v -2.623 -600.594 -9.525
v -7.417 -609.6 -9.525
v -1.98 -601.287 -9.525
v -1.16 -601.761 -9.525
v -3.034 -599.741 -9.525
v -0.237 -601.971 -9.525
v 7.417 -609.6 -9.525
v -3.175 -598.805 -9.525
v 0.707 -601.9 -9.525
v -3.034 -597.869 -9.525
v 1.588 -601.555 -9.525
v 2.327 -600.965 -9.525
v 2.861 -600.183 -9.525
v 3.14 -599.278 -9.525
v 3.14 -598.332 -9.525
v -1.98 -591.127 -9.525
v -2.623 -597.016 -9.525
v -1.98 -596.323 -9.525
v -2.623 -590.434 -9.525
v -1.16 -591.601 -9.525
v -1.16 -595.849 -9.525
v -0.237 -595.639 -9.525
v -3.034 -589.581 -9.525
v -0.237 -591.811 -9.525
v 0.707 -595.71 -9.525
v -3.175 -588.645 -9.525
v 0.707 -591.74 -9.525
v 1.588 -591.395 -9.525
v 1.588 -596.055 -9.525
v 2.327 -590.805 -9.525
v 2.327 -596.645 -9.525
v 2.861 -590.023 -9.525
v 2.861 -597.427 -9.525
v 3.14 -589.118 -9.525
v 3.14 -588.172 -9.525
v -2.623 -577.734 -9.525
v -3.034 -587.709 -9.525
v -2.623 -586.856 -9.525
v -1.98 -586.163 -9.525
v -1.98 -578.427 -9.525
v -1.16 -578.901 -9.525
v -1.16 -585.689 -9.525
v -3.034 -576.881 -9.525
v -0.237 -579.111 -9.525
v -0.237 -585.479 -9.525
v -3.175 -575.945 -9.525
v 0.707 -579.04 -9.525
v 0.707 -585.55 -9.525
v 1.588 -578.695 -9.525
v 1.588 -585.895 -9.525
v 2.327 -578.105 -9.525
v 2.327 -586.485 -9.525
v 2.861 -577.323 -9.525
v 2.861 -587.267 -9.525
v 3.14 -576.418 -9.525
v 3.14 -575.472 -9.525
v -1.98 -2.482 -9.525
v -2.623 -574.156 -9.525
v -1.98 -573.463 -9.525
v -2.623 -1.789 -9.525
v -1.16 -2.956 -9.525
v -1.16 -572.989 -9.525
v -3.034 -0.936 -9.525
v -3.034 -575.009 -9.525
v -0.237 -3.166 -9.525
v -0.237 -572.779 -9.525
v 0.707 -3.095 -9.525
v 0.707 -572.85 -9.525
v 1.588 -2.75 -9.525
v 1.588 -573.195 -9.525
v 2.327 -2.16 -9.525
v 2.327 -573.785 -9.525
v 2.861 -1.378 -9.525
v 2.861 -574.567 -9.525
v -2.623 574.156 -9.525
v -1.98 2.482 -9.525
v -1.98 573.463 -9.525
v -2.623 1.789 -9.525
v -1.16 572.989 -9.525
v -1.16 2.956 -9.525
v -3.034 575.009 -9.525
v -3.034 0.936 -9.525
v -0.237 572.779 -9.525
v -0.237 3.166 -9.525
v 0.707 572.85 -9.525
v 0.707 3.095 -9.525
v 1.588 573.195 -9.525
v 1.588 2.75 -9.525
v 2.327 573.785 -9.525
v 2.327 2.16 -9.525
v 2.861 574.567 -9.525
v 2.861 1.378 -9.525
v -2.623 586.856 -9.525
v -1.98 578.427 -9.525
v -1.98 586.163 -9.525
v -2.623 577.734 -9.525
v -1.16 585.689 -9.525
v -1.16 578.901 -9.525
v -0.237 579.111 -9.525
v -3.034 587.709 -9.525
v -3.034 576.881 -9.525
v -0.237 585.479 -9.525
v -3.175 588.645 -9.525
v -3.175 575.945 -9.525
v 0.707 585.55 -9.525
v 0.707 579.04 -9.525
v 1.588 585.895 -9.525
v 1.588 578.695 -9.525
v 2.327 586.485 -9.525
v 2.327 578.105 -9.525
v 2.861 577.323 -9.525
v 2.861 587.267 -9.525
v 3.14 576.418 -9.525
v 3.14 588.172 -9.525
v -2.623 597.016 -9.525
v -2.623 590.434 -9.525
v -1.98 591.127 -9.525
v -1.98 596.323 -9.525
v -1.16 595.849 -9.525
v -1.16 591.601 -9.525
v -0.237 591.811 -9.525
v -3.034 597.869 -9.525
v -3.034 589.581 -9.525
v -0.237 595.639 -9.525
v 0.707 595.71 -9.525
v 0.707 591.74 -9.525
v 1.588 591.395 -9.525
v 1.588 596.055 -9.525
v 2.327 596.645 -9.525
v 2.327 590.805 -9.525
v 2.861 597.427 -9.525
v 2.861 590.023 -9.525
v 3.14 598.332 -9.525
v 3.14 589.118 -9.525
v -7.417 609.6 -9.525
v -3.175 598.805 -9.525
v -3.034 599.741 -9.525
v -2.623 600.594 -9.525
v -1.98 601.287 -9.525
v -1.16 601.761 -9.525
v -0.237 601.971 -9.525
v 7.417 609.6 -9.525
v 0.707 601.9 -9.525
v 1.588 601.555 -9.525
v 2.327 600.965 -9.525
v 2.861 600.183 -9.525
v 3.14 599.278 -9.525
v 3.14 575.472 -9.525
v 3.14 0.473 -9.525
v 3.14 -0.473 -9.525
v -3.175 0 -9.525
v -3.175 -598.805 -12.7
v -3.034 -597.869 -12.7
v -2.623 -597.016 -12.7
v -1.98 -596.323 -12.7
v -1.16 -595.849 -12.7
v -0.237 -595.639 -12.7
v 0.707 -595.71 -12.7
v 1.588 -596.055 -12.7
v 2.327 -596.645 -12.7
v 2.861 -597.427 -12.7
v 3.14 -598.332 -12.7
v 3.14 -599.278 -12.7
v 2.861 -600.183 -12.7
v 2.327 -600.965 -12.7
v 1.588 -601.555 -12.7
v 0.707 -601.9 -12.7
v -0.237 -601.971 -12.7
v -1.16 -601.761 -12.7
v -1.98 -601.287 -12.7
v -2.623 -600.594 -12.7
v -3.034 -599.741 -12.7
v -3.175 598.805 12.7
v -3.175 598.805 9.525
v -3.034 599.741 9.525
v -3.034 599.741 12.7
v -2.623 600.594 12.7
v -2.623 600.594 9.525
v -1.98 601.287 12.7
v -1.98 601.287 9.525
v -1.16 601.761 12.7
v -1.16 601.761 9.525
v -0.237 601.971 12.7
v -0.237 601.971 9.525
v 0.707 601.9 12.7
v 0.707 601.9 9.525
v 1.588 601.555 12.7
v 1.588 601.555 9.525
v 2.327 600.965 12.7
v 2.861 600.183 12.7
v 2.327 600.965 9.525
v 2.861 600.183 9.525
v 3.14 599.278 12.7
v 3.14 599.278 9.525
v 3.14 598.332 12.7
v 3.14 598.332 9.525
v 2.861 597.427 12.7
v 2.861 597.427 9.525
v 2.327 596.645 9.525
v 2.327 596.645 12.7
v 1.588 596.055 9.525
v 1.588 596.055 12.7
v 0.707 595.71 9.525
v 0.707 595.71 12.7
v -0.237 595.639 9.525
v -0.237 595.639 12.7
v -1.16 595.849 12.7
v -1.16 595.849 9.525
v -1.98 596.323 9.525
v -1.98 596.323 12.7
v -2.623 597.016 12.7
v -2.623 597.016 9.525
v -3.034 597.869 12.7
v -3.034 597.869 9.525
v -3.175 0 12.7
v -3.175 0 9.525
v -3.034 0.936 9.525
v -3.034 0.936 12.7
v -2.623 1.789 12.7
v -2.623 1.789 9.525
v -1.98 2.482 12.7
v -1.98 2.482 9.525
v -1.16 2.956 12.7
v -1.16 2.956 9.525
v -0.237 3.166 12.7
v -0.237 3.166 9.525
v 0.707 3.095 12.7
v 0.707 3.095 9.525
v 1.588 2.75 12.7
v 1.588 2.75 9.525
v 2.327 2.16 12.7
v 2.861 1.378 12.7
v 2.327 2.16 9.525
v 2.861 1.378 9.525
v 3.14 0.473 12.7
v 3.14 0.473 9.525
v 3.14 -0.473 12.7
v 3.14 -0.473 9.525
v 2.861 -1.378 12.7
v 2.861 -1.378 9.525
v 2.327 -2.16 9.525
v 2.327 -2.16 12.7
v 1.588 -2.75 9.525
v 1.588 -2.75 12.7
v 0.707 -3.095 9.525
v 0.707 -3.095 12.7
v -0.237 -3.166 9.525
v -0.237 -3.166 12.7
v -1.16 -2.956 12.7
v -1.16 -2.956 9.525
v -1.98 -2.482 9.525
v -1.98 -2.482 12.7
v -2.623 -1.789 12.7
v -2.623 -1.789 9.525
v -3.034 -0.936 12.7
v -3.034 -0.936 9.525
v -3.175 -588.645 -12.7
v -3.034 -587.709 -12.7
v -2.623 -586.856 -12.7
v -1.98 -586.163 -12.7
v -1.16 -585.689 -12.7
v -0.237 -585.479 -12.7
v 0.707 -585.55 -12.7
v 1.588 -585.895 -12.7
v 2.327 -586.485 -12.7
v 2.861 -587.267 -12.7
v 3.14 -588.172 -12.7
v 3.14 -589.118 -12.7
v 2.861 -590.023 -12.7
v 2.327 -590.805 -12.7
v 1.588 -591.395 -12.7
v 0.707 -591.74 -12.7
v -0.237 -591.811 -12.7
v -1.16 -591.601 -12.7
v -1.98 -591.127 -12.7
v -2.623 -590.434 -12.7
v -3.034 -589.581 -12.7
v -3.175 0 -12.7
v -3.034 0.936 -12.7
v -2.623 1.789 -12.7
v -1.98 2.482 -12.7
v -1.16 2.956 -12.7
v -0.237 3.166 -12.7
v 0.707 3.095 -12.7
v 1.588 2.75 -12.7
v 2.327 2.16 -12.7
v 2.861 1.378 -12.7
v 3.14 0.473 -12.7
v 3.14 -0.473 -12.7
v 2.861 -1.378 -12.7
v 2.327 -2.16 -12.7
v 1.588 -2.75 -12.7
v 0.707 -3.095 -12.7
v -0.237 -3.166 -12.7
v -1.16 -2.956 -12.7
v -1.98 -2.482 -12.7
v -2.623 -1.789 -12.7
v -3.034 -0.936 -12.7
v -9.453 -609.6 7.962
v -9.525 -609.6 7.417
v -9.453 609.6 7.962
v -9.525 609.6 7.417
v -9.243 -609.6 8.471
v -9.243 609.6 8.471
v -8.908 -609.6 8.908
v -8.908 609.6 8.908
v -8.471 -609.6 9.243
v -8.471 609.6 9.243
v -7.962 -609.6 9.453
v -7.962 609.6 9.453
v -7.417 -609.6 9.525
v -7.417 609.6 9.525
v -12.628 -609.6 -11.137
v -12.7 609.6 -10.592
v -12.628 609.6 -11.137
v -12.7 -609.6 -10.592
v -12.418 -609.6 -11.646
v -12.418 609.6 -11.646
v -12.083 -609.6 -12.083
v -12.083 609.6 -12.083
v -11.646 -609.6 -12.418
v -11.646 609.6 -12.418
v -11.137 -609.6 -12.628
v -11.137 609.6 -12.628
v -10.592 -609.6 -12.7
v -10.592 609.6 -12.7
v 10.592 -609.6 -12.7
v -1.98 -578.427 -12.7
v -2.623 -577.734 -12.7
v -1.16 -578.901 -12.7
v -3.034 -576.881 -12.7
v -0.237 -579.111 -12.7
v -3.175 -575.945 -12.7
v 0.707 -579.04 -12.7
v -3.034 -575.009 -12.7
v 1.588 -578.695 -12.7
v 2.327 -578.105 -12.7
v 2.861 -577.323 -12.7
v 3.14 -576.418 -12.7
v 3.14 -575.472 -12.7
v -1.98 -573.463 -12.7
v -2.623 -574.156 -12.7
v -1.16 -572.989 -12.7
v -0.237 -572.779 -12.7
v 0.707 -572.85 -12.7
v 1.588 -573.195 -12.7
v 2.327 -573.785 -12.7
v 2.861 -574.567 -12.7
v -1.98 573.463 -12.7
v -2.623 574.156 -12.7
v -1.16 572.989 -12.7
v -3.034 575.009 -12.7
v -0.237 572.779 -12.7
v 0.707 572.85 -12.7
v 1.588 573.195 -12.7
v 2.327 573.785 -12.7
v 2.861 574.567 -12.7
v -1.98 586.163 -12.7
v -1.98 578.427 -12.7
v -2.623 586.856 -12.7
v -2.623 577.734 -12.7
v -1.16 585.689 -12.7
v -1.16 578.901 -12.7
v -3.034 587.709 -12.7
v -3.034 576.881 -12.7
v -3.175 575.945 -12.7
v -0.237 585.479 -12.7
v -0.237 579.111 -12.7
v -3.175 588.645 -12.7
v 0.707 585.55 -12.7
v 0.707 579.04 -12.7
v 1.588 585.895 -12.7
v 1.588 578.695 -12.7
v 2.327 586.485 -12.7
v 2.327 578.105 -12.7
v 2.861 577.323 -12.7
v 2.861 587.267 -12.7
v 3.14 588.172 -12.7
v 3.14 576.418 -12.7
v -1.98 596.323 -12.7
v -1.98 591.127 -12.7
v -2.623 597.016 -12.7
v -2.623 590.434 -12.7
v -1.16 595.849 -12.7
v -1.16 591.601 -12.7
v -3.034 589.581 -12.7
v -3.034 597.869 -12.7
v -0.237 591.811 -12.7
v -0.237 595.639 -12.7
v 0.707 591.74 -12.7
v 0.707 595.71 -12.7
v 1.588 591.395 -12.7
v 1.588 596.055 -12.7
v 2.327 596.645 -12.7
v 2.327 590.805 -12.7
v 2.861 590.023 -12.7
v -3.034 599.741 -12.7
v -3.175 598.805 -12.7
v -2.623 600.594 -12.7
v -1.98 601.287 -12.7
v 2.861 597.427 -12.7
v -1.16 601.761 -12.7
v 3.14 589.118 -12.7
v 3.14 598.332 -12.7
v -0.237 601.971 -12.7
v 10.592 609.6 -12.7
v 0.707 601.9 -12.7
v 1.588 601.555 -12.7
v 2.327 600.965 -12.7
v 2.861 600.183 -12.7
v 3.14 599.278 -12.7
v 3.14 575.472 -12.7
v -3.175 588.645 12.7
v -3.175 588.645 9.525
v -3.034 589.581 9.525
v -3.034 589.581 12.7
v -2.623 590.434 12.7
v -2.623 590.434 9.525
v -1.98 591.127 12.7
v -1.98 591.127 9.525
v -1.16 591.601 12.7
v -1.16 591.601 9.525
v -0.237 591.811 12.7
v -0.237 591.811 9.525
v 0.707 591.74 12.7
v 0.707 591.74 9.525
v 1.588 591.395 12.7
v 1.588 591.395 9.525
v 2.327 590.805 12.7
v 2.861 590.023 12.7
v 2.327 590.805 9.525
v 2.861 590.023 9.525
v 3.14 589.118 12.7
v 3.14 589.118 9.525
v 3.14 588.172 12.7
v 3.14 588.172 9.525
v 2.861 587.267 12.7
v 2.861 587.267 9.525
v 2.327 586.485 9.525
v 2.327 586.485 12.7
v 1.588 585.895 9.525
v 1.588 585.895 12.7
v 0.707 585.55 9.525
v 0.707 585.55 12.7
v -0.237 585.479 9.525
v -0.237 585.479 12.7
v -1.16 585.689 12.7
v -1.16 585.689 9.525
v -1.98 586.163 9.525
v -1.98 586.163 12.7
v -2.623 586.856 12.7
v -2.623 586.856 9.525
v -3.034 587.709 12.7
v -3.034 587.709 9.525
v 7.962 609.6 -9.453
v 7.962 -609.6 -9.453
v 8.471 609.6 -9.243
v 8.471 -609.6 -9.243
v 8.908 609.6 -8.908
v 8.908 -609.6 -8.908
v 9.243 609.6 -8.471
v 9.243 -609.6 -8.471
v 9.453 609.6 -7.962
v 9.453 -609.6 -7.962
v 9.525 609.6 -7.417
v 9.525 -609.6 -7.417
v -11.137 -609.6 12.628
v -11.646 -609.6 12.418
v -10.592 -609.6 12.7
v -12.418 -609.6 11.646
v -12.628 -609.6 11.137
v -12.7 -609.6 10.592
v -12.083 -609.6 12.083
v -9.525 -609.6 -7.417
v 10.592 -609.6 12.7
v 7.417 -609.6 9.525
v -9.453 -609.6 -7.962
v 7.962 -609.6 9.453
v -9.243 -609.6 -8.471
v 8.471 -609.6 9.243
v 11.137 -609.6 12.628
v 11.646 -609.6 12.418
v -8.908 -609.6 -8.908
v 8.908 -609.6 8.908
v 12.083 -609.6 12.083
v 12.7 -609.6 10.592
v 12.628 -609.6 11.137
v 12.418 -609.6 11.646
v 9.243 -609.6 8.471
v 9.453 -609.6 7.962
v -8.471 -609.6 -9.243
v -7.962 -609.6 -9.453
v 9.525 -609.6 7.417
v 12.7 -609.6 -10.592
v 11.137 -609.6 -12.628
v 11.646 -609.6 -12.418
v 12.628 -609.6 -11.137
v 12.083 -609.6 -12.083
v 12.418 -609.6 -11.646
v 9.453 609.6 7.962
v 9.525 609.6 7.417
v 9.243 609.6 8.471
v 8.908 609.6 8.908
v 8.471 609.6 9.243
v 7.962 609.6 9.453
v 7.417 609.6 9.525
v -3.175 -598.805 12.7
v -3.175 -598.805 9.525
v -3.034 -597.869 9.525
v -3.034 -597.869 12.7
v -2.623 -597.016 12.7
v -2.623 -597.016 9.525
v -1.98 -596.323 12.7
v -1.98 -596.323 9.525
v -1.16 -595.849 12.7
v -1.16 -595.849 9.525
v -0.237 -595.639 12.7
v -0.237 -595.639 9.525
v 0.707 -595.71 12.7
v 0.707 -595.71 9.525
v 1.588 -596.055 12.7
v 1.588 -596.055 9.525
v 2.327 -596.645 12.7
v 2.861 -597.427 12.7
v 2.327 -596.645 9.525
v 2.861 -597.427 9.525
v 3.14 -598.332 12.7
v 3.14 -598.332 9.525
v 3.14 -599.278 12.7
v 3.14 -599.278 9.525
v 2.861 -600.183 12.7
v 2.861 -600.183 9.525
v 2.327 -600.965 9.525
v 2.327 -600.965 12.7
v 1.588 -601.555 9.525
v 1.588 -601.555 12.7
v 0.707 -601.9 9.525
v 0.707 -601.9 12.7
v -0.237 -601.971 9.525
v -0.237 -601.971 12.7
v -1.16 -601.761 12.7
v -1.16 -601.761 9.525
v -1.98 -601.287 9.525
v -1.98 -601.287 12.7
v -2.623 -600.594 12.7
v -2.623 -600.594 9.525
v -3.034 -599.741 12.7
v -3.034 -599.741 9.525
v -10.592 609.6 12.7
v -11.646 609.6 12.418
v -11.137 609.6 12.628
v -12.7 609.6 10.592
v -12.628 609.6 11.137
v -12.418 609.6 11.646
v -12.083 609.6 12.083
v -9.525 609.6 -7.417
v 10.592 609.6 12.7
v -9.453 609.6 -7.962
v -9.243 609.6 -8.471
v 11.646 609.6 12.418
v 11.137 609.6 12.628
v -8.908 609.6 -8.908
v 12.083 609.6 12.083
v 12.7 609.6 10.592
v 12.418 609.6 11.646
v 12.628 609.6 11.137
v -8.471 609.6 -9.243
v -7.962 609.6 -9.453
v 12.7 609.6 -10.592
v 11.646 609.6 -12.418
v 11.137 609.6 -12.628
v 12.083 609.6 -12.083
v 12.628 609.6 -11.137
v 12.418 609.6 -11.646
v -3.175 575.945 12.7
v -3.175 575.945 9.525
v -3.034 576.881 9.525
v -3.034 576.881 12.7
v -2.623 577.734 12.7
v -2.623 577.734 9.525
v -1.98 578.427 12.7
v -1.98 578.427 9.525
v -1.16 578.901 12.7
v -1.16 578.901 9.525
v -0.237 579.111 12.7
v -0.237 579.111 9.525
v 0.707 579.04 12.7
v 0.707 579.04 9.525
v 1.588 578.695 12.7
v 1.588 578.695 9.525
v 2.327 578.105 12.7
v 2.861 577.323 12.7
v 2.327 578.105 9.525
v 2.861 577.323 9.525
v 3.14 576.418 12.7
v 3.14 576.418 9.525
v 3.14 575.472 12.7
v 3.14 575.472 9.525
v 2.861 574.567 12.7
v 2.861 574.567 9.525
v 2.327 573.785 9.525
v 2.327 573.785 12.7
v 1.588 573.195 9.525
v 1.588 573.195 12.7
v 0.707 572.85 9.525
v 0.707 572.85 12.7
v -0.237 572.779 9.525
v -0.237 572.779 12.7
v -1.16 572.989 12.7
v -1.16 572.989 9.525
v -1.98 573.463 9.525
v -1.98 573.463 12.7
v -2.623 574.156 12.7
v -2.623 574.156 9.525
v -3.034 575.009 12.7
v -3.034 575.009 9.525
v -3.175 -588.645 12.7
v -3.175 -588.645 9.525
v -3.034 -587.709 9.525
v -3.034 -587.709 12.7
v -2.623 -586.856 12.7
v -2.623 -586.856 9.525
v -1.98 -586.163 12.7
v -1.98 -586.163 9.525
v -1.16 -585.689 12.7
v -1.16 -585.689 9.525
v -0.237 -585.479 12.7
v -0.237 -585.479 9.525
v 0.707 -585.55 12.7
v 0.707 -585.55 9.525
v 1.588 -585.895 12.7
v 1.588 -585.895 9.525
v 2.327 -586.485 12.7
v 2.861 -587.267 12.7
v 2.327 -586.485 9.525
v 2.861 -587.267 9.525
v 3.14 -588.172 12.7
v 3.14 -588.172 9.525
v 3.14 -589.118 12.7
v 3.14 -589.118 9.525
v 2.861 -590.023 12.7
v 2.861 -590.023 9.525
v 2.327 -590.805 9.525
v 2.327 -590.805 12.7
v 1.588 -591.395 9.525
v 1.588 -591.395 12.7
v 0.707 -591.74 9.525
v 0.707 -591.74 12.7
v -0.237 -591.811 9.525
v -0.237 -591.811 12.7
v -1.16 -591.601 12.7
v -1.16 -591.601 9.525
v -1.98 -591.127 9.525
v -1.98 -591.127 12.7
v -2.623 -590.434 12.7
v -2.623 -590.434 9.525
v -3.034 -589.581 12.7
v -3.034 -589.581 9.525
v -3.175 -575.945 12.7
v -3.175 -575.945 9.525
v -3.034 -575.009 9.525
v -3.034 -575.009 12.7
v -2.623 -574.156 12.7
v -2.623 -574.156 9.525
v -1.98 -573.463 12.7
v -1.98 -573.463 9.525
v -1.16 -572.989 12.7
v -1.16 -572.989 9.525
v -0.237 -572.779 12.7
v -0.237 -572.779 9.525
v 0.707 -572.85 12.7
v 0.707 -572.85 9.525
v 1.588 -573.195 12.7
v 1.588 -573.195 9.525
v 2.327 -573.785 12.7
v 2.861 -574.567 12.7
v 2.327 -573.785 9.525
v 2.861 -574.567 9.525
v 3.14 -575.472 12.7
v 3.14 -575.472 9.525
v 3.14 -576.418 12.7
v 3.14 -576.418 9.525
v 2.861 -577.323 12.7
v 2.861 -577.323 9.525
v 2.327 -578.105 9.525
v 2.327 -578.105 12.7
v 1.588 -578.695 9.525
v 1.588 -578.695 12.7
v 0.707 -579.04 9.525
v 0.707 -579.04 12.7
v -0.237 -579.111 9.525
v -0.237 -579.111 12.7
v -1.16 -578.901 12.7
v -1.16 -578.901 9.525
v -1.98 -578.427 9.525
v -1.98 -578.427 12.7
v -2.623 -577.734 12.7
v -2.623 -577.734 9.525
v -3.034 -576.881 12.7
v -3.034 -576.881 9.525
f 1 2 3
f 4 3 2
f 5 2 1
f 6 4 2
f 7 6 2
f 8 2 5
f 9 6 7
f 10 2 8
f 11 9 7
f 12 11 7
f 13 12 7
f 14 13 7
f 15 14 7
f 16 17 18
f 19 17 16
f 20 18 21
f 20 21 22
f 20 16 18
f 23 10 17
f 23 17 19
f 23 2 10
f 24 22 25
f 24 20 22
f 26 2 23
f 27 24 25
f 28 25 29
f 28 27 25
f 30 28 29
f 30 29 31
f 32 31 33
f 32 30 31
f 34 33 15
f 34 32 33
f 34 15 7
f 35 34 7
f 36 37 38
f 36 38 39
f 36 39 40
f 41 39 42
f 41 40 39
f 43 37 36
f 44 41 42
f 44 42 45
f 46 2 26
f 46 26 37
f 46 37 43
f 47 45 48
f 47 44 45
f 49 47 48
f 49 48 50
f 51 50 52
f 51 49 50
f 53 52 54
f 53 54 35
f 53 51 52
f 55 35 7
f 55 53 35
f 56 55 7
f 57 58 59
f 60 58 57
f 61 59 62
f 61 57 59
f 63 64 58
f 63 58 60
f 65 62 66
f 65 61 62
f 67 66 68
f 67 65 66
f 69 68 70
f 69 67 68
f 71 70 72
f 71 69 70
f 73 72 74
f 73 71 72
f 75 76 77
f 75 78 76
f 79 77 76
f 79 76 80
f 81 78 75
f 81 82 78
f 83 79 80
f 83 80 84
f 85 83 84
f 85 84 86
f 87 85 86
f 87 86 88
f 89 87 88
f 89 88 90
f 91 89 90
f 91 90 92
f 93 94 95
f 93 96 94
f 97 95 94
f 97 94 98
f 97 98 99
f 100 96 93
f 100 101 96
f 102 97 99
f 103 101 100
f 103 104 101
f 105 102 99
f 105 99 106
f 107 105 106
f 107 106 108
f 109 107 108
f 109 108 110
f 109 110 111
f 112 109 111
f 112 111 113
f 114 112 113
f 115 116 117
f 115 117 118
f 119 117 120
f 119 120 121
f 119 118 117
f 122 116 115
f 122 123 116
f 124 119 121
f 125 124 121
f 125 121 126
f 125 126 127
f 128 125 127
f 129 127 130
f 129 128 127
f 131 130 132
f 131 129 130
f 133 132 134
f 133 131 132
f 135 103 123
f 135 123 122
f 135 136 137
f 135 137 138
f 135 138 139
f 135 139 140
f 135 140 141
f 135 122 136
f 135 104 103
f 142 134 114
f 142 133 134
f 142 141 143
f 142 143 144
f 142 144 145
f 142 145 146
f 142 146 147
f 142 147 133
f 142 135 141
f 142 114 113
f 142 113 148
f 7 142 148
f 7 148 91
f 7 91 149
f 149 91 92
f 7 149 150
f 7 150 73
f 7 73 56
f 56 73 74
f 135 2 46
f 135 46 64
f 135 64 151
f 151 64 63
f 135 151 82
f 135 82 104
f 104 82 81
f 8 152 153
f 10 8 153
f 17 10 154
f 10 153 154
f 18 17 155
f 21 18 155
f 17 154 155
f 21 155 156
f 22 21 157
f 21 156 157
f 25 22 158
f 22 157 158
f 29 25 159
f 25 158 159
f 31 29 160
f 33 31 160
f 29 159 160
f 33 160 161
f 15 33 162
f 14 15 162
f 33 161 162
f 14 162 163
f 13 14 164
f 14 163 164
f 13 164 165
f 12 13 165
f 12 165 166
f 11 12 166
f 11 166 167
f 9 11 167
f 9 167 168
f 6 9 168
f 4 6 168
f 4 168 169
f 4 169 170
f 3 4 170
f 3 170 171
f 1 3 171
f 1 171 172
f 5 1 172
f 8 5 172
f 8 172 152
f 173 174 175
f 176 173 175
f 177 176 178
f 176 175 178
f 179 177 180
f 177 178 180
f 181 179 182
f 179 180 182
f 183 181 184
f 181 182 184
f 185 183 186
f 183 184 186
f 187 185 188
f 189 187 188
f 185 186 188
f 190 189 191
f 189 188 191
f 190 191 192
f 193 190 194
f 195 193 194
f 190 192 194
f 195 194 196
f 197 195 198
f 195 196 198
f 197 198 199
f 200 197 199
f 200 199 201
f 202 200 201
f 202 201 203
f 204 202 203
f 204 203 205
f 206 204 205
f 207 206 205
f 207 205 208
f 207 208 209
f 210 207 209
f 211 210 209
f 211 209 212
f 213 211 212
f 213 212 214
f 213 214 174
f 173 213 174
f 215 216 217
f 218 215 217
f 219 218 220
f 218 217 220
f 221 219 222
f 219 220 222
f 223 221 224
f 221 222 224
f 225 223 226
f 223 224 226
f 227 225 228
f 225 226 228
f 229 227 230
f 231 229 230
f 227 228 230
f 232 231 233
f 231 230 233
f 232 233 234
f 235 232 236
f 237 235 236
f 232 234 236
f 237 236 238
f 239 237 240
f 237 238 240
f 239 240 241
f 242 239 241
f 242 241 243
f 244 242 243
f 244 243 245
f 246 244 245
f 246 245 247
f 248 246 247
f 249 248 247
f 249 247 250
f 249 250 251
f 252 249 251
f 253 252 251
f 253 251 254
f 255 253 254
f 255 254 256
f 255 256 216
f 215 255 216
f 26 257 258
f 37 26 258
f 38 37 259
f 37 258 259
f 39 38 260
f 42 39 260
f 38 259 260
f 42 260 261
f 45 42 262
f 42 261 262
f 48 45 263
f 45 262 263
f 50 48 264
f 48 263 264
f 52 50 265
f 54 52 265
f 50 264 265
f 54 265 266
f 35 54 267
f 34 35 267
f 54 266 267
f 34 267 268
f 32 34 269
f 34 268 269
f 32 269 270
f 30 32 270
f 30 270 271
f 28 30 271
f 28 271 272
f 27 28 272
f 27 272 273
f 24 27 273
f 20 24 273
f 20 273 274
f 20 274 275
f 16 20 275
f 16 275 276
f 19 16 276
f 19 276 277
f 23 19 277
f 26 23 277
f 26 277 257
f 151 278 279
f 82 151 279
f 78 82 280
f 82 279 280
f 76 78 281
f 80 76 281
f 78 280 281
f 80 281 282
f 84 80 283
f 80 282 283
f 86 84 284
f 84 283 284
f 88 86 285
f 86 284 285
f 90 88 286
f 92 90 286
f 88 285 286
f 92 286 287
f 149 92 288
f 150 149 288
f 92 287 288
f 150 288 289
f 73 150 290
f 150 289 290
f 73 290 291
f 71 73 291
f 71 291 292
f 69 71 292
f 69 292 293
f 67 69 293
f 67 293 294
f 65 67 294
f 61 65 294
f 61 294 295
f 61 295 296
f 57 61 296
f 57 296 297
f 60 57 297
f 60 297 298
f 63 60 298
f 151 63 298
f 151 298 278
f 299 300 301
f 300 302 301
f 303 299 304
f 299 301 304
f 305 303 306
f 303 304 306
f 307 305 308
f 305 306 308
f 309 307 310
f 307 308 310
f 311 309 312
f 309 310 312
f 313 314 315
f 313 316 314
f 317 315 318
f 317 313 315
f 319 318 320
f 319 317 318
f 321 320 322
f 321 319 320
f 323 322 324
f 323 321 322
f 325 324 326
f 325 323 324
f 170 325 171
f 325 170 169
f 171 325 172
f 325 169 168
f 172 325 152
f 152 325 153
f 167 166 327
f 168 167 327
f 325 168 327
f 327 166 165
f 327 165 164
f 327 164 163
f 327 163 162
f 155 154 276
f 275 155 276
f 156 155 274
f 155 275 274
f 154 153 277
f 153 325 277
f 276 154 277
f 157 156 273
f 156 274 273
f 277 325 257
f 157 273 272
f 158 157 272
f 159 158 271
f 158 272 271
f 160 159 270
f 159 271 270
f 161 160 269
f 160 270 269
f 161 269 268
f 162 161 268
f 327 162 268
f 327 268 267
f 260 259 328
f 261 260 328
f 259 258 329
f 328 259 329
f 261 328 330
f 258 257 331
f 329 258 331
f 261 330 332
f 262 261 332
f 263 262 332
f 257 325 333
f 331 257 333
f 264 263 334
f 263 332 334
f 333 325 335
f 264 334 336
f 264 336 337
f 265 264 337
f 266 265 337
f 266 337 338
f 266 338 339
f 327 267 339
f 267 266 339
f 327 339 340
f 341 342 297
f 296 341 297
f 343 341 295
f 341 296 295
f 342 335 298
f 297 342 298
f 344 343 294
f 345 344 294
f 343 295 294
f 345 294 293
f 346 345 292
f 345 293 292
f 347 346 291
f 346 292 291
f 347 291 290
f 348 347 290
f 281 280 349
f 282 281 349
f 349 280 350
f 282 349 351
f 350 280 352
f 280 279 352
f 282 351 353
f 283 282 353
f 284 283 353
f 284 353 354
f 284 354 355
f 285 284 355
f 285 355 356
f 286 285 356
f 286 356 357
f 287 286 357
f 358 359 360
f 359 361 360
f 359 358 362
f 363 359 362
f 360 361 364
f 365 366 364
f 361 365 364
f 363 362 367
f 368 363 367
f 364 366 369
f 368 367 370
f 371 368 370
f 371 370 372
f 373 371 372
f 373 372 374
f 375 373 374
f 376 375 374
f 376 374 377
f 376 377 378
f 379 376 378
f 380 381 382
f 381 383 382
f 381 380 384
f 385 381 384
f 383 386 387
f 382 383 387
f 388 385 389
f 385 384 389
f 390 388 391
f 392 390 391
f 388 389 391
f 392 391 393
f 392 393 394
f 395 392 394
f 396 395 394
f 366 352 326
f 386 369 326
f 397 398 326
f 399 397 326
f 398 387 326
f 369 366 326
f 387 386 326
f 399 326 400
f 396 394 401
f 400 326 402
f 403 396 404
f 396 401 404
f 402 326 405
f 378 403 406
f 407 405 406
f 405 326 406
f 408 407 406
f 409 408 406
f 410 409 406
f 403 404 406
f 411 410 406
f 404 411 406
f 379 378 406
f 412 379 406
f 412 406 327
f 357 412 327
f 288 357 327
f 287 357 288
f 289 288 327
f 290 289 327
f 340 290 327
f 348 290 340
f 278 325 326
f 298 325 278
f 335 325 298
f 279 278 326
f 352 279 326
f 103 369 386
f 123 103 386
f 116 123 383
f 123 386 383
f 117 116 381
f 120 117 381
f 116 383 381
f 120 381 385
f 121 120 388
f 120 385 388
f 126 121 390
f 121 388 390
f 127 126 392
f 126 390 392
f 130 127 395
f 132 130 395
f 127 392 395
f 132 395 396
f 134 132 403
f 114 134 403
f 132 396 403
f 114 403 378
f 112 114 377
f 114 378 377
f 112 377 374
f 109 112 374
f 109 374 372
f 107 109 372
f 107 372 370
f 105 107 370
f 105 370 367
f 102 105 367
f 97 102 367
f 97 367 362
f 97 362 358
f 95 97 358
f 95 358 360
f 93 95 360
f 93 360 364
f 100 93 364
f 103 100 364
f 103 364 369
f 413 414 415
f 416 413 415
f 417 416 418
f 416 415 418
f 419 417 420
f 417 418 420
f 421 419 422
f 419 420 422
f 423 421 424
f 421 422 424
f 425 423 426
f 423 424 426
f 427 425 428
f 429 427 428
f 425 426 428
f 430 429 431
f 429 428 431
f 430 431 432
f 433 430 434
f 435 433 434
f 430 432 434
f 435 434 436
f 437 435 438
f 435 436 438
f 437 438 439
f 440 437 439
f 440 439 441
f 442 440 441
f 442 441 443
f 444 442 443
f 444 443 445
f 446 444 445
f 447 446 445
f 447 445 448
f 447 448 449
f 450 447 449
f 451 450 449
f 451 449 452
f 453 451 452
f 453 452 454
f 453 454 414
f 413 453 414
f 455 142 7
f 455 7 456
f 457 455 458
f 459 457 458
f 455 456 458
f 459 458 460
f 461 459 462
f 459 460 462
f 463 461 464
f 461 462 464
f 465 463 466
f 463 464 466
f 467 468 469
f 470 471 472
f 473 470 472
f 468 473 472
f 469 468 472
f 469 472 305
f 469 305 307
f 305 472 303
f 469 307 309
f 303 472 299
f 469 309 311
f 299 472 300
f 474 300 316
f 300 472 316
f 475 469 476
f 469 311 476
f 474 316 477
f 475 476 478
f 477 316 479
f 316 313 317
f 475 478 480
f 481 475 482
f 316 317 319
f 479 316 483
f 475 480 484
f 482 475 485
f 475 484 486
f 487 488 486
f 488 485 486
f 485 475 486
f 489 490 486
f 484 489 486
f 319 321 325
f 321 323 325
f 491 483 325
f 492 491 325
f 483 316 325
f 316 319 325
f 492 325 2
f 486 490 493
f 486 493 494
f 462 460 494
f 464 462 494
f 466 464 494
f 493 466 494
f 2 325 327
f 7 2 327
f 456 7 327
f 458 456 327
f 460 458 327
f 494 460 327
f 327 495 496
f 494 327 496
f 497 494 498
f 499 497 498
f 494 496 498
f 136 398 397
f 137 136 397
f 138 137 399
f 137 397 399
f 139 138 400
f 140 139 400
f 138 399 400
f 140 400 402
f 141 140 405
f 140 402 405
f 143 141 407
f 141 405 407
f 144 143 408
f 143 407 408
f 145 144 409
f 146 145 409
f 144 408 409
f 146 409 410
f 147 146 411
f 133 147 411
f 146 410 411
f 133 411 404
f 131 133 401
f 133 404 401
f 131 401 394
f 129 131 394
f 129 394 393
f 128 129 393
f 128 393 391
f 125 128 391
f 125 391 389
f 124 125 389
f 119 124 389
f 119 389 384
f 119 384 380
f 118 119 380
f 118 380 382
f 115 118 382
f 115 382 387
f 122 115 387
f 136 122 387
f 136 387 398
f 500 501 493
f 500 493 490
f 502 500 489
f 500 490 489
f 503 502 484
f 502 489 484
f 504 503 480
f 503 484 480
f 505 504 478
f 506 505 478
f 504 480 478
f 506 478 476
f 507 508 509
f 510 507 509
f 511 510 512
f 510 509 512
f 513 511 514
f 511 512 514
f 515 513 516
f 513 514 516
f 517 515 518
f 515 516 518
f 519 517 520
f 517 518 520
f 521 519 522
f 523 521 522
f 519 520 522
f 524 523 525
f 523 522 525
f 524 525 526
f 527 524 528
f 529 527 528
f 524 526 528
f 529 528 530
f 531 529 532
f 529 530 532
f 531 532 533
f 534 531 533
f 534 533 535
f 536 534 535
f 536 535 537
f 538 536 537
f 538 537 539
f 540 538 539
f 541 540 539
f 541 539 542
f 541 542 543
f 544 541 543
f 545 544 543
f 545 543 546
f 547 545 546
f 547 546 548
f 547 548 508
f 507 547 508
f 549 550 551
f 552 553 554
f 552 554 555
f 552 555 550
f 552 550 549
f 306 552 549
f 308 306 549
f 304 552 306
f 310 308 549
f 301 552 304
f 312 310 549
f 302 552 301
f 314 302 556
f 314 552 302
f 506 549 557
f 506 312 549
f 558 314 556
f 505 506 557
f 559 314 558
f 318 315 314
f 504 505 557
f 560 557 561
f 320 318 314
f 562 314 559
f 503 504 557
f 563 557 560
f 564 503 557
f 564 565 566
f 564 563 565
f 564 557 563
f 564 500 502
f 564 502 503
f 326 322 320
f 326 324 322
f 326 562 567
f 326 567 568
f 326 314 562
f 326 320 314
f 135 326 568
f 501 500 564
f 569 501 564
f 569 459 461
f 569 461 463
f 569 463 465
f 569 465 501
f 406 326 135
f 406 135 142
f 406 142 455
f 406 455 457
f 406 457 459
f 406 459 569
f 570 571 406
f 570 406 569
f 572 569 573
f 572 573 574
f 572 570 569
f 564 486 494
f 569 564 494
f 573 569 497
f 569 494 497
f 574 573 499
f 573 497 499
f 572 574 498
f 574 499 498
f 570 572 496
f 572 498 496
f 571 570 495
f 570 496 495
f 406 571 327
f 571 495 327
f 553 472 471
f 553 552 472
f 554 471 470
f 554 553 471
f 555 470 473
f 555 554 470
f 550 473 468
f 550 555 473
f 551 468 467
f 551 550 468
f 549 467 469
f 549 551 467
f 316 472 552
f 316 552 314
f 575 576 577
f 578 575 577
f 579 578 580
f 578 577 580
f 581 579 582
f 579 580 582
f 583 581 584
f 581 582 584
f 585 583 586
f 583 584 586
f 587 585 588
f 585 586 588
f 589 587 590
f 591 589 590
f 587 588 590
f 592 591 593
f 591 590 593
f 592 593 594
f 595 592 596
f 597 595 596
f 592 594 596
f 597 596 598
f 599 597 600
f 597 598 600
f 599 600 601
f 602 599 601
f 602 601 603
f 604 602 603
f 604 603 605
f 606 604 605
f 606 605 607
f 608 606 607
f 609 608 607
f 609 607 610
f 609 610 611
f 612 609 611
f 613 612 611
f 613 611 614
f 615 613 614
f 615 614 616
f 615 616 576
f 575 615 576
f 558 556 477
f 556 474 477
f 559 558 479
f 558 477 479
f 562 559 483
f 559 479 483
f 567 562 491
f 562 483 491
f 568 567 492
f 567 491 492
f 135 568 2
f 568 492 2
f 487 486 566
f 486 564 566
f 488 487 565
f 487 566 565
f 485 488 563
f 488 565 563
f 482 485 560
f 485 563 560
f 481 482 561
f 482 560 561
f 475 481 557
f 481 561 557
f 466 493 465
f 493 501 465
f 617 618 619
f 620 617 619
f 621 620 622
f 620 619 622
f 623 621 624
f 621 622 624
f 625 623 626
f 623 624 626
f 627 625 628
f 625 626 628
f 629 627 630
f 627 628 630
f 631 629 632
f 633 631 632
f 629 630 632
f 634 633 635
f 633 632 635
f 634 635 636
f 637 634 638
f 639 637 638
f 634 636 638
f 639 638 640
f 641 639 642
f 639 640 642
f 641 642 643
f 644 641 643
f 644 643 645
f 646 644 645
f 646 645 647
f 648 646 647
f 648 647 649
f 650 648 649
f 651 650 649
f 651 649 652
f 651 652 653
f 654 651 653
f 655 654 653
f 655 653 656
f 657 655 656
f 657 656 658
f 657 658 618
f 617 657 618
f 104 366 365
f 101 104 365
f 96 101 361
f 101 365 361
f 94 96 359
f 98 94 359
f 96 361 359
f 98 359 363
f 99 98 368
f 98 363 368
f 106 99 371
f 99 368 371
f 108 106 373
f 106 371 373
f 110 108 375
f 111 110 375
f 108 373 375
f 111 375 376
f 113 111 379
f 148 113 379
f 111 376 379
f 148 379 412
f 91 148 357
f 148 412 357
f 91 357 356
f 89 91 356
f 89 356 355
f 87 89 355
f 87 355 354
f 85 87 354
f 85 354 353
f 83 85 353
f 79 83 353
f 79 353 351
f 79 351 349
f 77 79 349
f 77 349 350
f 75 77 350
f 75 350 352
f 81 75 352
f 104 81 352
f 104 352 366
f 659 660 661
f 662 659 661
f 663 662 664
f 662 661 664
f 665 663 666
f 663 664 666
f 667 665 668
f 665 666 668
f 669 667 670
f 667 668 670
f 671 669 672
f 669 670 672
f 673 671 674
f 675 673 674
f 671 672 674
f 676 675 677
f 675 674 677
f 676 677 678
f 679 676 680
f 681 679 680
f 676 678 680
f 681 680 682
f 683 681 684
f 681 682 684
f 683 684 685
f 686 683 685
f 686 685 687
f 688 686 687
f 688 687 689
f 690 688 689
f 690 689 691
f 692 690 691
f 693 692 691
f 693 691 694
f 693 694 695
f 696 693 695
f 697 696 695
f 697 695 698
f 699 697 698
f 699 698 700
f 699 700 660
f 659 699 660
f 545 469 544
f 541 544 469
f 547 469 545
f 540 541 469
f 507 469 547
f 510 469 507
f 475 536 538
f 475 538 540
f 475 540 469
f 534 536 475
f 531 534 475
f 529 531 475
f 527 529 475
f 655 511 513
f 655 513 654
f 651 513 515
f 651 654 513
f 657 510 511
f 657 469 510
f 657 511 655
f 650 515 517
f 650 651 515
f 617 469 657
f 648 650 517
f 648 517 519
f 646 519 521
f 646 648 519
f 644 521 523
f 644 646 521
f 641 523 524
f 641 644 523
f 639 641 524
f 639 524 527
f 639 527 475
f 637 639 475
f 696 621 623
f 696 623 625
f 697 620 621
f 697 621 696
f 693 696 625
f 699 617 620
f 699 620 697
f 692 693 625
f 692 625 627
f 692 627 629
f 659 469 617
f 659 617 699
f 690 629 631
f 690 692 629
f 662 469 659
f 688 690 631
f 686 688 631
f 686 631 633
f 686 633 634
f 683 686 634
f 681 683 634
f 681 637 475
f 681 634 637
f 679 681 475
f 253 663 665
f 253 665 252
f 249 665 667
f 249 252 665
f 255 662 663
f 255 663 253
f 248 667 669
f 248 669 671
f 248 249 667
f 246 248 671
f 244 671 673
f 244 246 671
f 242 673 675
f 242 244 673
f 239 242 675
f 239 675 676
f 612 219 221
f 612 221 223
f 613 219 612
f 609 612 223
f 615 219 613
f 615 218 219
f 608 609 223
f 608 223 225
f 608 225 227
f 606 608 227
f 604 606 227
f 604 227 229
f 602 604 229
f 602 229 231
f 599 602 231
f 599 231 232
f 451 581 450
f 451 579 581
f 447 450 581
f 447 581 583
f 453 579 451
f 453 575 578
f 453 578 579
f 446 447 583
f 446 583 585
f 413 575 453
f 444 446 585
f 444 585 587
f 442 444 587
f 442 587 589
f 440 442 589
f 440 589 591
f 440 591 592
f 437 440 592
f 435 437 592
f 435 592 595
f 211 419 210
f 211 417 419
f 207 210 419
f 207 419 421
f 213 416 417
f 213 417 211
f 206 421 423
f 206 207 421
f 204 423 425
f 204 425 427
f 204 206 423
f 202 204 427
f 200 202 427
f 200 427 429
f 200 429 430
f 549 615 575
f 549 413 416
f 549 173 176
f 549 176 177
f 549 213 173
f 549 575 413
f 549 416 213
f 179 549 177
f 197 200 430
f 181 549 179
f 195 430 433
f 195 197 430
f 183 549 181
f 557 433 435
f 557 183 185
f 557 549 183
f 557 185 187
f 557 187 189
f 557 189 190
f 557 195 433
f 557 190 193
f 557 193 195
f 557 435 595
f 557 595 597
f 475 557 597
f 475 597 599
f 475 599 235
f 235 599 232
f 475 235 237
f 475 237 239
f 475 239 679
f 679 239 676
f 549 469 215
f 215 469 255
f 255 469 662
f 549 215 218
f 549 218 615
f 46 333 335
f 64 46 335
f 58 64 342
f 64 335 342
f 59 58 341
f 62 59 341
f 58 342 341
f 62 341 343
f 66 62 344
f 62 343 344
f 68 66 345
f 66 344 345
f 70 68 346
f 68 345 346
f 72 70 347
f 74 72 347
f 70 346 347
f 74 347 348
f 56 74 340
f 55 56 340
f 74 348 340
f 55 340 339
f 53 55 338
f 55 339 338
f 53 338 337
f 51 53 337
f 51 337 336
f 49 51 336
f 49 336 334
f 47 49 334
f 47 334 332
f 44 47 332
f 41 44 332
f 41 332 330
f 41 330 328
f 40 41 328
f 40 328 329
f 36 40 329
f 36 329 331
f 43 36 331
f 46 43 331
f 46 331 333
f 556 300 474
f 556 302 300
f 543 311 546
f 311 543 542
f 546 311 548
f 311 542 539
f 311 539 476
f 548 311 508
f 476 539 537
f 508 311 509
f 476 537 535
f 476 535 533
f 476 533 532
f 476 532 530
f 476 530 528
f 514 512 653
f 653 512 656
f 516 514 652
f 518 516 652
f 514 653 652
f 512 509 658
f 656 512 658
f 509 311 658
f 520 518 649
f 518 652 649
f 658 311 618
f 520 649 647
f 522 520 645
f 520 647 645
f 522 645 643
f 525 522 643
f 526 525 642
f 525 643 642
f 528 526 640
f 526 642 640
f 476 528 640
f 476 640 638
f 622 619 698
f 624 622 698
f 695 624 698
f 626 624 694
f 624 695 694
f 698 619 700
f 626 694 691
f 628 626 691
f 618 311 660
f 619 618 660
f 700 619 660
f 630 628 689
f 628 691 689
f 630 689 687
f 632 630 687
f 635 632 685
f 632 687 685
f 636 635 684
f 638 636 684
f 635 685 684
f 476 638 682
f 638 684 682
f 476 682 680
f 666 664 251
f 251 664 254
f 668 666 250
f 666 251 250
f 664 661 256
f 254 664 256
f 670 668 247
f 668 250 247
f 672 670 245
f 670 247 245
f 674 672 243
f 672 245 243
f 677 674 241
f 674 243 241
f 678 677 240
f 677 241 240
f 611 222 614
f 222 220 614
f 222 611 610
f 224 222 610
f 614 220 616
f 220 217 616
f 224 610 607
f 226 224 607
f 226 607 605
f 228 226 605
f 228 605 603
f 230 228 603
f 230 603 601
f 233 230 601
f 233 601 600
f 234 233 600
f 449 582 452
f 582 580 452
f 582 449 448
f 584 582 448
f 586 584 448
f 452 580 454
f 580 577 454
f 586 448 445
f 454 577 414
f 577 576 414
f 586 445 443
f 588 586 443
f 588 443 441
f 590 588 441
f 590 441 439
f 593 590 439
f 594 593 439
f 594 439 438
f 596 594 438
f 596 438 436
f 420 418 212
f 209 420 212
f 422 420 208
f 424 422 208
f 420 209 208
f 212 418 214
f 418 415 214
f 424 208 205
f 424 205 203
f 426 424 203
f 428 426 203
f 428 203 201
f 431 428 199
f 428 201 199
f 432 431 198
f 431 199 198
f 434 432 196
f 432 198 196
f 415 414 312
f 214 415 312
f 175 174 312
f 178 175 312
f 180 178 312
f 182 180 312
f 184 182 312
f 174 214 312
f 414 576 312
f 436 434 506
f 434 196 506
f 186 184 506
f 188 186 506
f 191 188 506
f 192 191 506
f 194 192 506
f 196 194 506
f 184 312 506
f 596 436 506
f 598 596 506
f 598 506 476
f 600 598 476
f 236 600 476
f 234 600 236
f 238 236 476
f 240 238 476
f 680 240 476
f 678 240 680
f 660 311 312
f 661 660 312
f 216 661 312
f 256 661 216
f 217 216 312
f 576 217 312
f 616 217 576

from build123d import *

# Parameters (mm, degrees)
SKETCH1_W           = 25.4
SKETCH1_H           = 25.4
SKETCH1_W_2         = 19.05
SKETCH1_H_2         = 19.05
BOSS_EXTRUDE1_DEPTH = 609.6
FILLET1_R           = 2.1082
SKETCH6_R           = 3.175
CUT_EXTRUDE5_DEPTH  = 611.261099858
SKETCH7_R           = 3.175
CUT_EXTRUDE6_DEPTH  = 611.261099858


with BuildPart() as part:
    # Sketch1 → Boss-Extrude1 (new, symmetric)
    with BuildSketch(Plane(origin=(0, 0, 0), x_dir=(1, 0, 0), z_dir=(0, 1, 0))):
        Rectangle(SKETCH1_W, SKETCH1_H)
        Rectangle(SKETCH1_W_2, SKETCH1_H_2, mode=Mode.SUBTRACT)
    extrude(amount=BOSS_EXTRUDE1_DEPTH, both=True)

    # Fillet1
    fillet1_edges = [part.edges().sort_by_distance(p)[0] for p in [
        (9.525, 0, 9.525),
        (9.525, 0, -9.525),
        (-9.525, 0, -9.525),
        (-9.525, 0, 9.525),
        (-12.7, 0, -12.7),
        (12.7, 0, -12.7),
        (12.7, 0, 12.7),
        (-12.7, 0, 12.7),
    ]]
    fillet(fillet1_edges, radius=FILLET1_R)

    # Sketch6 → Cut-Extrude5 (cut, through all)
    with BuildSketch(Plane(origin=(0, 0, -12.7), x_dir=(-1, 0, 0), z_dir=(0, 0, -1))):
        with Locations((0, -598.805)):
            Circle(SKETCH6_R)
        with Locations((0, -588.645)):
            Circle(SKETCH6_R)
        with Locations((0, -575.945)):
            Circle(SKETCH6_R)
        with Locations((0, 598.805)):
            Circle(SKETCH6_R)
        with Locations((0, 588.645)):
            Circle(SKETCH6_R)
        with Locations((0, 575.945)):
            Circle(SKETCH6_R)
    extrude(amount=-CUT_EXTRUDE5_DEPTH, mode=Mode.SUBTRACT)

    # Sketch7 → Cut-Extrude6 (cut, through all)
    with BuildSketch(Plane(origin=(0, 0, -12.7), x_dir=(-1, 0, 0), z_dir=(0, 0, -1))):
        Circle(SKETCH7_R)
    extrude(amount=-CUT_EXTRUDE6_DEPTH, mode=Mode.SUBTRACT)


solid = part.part
